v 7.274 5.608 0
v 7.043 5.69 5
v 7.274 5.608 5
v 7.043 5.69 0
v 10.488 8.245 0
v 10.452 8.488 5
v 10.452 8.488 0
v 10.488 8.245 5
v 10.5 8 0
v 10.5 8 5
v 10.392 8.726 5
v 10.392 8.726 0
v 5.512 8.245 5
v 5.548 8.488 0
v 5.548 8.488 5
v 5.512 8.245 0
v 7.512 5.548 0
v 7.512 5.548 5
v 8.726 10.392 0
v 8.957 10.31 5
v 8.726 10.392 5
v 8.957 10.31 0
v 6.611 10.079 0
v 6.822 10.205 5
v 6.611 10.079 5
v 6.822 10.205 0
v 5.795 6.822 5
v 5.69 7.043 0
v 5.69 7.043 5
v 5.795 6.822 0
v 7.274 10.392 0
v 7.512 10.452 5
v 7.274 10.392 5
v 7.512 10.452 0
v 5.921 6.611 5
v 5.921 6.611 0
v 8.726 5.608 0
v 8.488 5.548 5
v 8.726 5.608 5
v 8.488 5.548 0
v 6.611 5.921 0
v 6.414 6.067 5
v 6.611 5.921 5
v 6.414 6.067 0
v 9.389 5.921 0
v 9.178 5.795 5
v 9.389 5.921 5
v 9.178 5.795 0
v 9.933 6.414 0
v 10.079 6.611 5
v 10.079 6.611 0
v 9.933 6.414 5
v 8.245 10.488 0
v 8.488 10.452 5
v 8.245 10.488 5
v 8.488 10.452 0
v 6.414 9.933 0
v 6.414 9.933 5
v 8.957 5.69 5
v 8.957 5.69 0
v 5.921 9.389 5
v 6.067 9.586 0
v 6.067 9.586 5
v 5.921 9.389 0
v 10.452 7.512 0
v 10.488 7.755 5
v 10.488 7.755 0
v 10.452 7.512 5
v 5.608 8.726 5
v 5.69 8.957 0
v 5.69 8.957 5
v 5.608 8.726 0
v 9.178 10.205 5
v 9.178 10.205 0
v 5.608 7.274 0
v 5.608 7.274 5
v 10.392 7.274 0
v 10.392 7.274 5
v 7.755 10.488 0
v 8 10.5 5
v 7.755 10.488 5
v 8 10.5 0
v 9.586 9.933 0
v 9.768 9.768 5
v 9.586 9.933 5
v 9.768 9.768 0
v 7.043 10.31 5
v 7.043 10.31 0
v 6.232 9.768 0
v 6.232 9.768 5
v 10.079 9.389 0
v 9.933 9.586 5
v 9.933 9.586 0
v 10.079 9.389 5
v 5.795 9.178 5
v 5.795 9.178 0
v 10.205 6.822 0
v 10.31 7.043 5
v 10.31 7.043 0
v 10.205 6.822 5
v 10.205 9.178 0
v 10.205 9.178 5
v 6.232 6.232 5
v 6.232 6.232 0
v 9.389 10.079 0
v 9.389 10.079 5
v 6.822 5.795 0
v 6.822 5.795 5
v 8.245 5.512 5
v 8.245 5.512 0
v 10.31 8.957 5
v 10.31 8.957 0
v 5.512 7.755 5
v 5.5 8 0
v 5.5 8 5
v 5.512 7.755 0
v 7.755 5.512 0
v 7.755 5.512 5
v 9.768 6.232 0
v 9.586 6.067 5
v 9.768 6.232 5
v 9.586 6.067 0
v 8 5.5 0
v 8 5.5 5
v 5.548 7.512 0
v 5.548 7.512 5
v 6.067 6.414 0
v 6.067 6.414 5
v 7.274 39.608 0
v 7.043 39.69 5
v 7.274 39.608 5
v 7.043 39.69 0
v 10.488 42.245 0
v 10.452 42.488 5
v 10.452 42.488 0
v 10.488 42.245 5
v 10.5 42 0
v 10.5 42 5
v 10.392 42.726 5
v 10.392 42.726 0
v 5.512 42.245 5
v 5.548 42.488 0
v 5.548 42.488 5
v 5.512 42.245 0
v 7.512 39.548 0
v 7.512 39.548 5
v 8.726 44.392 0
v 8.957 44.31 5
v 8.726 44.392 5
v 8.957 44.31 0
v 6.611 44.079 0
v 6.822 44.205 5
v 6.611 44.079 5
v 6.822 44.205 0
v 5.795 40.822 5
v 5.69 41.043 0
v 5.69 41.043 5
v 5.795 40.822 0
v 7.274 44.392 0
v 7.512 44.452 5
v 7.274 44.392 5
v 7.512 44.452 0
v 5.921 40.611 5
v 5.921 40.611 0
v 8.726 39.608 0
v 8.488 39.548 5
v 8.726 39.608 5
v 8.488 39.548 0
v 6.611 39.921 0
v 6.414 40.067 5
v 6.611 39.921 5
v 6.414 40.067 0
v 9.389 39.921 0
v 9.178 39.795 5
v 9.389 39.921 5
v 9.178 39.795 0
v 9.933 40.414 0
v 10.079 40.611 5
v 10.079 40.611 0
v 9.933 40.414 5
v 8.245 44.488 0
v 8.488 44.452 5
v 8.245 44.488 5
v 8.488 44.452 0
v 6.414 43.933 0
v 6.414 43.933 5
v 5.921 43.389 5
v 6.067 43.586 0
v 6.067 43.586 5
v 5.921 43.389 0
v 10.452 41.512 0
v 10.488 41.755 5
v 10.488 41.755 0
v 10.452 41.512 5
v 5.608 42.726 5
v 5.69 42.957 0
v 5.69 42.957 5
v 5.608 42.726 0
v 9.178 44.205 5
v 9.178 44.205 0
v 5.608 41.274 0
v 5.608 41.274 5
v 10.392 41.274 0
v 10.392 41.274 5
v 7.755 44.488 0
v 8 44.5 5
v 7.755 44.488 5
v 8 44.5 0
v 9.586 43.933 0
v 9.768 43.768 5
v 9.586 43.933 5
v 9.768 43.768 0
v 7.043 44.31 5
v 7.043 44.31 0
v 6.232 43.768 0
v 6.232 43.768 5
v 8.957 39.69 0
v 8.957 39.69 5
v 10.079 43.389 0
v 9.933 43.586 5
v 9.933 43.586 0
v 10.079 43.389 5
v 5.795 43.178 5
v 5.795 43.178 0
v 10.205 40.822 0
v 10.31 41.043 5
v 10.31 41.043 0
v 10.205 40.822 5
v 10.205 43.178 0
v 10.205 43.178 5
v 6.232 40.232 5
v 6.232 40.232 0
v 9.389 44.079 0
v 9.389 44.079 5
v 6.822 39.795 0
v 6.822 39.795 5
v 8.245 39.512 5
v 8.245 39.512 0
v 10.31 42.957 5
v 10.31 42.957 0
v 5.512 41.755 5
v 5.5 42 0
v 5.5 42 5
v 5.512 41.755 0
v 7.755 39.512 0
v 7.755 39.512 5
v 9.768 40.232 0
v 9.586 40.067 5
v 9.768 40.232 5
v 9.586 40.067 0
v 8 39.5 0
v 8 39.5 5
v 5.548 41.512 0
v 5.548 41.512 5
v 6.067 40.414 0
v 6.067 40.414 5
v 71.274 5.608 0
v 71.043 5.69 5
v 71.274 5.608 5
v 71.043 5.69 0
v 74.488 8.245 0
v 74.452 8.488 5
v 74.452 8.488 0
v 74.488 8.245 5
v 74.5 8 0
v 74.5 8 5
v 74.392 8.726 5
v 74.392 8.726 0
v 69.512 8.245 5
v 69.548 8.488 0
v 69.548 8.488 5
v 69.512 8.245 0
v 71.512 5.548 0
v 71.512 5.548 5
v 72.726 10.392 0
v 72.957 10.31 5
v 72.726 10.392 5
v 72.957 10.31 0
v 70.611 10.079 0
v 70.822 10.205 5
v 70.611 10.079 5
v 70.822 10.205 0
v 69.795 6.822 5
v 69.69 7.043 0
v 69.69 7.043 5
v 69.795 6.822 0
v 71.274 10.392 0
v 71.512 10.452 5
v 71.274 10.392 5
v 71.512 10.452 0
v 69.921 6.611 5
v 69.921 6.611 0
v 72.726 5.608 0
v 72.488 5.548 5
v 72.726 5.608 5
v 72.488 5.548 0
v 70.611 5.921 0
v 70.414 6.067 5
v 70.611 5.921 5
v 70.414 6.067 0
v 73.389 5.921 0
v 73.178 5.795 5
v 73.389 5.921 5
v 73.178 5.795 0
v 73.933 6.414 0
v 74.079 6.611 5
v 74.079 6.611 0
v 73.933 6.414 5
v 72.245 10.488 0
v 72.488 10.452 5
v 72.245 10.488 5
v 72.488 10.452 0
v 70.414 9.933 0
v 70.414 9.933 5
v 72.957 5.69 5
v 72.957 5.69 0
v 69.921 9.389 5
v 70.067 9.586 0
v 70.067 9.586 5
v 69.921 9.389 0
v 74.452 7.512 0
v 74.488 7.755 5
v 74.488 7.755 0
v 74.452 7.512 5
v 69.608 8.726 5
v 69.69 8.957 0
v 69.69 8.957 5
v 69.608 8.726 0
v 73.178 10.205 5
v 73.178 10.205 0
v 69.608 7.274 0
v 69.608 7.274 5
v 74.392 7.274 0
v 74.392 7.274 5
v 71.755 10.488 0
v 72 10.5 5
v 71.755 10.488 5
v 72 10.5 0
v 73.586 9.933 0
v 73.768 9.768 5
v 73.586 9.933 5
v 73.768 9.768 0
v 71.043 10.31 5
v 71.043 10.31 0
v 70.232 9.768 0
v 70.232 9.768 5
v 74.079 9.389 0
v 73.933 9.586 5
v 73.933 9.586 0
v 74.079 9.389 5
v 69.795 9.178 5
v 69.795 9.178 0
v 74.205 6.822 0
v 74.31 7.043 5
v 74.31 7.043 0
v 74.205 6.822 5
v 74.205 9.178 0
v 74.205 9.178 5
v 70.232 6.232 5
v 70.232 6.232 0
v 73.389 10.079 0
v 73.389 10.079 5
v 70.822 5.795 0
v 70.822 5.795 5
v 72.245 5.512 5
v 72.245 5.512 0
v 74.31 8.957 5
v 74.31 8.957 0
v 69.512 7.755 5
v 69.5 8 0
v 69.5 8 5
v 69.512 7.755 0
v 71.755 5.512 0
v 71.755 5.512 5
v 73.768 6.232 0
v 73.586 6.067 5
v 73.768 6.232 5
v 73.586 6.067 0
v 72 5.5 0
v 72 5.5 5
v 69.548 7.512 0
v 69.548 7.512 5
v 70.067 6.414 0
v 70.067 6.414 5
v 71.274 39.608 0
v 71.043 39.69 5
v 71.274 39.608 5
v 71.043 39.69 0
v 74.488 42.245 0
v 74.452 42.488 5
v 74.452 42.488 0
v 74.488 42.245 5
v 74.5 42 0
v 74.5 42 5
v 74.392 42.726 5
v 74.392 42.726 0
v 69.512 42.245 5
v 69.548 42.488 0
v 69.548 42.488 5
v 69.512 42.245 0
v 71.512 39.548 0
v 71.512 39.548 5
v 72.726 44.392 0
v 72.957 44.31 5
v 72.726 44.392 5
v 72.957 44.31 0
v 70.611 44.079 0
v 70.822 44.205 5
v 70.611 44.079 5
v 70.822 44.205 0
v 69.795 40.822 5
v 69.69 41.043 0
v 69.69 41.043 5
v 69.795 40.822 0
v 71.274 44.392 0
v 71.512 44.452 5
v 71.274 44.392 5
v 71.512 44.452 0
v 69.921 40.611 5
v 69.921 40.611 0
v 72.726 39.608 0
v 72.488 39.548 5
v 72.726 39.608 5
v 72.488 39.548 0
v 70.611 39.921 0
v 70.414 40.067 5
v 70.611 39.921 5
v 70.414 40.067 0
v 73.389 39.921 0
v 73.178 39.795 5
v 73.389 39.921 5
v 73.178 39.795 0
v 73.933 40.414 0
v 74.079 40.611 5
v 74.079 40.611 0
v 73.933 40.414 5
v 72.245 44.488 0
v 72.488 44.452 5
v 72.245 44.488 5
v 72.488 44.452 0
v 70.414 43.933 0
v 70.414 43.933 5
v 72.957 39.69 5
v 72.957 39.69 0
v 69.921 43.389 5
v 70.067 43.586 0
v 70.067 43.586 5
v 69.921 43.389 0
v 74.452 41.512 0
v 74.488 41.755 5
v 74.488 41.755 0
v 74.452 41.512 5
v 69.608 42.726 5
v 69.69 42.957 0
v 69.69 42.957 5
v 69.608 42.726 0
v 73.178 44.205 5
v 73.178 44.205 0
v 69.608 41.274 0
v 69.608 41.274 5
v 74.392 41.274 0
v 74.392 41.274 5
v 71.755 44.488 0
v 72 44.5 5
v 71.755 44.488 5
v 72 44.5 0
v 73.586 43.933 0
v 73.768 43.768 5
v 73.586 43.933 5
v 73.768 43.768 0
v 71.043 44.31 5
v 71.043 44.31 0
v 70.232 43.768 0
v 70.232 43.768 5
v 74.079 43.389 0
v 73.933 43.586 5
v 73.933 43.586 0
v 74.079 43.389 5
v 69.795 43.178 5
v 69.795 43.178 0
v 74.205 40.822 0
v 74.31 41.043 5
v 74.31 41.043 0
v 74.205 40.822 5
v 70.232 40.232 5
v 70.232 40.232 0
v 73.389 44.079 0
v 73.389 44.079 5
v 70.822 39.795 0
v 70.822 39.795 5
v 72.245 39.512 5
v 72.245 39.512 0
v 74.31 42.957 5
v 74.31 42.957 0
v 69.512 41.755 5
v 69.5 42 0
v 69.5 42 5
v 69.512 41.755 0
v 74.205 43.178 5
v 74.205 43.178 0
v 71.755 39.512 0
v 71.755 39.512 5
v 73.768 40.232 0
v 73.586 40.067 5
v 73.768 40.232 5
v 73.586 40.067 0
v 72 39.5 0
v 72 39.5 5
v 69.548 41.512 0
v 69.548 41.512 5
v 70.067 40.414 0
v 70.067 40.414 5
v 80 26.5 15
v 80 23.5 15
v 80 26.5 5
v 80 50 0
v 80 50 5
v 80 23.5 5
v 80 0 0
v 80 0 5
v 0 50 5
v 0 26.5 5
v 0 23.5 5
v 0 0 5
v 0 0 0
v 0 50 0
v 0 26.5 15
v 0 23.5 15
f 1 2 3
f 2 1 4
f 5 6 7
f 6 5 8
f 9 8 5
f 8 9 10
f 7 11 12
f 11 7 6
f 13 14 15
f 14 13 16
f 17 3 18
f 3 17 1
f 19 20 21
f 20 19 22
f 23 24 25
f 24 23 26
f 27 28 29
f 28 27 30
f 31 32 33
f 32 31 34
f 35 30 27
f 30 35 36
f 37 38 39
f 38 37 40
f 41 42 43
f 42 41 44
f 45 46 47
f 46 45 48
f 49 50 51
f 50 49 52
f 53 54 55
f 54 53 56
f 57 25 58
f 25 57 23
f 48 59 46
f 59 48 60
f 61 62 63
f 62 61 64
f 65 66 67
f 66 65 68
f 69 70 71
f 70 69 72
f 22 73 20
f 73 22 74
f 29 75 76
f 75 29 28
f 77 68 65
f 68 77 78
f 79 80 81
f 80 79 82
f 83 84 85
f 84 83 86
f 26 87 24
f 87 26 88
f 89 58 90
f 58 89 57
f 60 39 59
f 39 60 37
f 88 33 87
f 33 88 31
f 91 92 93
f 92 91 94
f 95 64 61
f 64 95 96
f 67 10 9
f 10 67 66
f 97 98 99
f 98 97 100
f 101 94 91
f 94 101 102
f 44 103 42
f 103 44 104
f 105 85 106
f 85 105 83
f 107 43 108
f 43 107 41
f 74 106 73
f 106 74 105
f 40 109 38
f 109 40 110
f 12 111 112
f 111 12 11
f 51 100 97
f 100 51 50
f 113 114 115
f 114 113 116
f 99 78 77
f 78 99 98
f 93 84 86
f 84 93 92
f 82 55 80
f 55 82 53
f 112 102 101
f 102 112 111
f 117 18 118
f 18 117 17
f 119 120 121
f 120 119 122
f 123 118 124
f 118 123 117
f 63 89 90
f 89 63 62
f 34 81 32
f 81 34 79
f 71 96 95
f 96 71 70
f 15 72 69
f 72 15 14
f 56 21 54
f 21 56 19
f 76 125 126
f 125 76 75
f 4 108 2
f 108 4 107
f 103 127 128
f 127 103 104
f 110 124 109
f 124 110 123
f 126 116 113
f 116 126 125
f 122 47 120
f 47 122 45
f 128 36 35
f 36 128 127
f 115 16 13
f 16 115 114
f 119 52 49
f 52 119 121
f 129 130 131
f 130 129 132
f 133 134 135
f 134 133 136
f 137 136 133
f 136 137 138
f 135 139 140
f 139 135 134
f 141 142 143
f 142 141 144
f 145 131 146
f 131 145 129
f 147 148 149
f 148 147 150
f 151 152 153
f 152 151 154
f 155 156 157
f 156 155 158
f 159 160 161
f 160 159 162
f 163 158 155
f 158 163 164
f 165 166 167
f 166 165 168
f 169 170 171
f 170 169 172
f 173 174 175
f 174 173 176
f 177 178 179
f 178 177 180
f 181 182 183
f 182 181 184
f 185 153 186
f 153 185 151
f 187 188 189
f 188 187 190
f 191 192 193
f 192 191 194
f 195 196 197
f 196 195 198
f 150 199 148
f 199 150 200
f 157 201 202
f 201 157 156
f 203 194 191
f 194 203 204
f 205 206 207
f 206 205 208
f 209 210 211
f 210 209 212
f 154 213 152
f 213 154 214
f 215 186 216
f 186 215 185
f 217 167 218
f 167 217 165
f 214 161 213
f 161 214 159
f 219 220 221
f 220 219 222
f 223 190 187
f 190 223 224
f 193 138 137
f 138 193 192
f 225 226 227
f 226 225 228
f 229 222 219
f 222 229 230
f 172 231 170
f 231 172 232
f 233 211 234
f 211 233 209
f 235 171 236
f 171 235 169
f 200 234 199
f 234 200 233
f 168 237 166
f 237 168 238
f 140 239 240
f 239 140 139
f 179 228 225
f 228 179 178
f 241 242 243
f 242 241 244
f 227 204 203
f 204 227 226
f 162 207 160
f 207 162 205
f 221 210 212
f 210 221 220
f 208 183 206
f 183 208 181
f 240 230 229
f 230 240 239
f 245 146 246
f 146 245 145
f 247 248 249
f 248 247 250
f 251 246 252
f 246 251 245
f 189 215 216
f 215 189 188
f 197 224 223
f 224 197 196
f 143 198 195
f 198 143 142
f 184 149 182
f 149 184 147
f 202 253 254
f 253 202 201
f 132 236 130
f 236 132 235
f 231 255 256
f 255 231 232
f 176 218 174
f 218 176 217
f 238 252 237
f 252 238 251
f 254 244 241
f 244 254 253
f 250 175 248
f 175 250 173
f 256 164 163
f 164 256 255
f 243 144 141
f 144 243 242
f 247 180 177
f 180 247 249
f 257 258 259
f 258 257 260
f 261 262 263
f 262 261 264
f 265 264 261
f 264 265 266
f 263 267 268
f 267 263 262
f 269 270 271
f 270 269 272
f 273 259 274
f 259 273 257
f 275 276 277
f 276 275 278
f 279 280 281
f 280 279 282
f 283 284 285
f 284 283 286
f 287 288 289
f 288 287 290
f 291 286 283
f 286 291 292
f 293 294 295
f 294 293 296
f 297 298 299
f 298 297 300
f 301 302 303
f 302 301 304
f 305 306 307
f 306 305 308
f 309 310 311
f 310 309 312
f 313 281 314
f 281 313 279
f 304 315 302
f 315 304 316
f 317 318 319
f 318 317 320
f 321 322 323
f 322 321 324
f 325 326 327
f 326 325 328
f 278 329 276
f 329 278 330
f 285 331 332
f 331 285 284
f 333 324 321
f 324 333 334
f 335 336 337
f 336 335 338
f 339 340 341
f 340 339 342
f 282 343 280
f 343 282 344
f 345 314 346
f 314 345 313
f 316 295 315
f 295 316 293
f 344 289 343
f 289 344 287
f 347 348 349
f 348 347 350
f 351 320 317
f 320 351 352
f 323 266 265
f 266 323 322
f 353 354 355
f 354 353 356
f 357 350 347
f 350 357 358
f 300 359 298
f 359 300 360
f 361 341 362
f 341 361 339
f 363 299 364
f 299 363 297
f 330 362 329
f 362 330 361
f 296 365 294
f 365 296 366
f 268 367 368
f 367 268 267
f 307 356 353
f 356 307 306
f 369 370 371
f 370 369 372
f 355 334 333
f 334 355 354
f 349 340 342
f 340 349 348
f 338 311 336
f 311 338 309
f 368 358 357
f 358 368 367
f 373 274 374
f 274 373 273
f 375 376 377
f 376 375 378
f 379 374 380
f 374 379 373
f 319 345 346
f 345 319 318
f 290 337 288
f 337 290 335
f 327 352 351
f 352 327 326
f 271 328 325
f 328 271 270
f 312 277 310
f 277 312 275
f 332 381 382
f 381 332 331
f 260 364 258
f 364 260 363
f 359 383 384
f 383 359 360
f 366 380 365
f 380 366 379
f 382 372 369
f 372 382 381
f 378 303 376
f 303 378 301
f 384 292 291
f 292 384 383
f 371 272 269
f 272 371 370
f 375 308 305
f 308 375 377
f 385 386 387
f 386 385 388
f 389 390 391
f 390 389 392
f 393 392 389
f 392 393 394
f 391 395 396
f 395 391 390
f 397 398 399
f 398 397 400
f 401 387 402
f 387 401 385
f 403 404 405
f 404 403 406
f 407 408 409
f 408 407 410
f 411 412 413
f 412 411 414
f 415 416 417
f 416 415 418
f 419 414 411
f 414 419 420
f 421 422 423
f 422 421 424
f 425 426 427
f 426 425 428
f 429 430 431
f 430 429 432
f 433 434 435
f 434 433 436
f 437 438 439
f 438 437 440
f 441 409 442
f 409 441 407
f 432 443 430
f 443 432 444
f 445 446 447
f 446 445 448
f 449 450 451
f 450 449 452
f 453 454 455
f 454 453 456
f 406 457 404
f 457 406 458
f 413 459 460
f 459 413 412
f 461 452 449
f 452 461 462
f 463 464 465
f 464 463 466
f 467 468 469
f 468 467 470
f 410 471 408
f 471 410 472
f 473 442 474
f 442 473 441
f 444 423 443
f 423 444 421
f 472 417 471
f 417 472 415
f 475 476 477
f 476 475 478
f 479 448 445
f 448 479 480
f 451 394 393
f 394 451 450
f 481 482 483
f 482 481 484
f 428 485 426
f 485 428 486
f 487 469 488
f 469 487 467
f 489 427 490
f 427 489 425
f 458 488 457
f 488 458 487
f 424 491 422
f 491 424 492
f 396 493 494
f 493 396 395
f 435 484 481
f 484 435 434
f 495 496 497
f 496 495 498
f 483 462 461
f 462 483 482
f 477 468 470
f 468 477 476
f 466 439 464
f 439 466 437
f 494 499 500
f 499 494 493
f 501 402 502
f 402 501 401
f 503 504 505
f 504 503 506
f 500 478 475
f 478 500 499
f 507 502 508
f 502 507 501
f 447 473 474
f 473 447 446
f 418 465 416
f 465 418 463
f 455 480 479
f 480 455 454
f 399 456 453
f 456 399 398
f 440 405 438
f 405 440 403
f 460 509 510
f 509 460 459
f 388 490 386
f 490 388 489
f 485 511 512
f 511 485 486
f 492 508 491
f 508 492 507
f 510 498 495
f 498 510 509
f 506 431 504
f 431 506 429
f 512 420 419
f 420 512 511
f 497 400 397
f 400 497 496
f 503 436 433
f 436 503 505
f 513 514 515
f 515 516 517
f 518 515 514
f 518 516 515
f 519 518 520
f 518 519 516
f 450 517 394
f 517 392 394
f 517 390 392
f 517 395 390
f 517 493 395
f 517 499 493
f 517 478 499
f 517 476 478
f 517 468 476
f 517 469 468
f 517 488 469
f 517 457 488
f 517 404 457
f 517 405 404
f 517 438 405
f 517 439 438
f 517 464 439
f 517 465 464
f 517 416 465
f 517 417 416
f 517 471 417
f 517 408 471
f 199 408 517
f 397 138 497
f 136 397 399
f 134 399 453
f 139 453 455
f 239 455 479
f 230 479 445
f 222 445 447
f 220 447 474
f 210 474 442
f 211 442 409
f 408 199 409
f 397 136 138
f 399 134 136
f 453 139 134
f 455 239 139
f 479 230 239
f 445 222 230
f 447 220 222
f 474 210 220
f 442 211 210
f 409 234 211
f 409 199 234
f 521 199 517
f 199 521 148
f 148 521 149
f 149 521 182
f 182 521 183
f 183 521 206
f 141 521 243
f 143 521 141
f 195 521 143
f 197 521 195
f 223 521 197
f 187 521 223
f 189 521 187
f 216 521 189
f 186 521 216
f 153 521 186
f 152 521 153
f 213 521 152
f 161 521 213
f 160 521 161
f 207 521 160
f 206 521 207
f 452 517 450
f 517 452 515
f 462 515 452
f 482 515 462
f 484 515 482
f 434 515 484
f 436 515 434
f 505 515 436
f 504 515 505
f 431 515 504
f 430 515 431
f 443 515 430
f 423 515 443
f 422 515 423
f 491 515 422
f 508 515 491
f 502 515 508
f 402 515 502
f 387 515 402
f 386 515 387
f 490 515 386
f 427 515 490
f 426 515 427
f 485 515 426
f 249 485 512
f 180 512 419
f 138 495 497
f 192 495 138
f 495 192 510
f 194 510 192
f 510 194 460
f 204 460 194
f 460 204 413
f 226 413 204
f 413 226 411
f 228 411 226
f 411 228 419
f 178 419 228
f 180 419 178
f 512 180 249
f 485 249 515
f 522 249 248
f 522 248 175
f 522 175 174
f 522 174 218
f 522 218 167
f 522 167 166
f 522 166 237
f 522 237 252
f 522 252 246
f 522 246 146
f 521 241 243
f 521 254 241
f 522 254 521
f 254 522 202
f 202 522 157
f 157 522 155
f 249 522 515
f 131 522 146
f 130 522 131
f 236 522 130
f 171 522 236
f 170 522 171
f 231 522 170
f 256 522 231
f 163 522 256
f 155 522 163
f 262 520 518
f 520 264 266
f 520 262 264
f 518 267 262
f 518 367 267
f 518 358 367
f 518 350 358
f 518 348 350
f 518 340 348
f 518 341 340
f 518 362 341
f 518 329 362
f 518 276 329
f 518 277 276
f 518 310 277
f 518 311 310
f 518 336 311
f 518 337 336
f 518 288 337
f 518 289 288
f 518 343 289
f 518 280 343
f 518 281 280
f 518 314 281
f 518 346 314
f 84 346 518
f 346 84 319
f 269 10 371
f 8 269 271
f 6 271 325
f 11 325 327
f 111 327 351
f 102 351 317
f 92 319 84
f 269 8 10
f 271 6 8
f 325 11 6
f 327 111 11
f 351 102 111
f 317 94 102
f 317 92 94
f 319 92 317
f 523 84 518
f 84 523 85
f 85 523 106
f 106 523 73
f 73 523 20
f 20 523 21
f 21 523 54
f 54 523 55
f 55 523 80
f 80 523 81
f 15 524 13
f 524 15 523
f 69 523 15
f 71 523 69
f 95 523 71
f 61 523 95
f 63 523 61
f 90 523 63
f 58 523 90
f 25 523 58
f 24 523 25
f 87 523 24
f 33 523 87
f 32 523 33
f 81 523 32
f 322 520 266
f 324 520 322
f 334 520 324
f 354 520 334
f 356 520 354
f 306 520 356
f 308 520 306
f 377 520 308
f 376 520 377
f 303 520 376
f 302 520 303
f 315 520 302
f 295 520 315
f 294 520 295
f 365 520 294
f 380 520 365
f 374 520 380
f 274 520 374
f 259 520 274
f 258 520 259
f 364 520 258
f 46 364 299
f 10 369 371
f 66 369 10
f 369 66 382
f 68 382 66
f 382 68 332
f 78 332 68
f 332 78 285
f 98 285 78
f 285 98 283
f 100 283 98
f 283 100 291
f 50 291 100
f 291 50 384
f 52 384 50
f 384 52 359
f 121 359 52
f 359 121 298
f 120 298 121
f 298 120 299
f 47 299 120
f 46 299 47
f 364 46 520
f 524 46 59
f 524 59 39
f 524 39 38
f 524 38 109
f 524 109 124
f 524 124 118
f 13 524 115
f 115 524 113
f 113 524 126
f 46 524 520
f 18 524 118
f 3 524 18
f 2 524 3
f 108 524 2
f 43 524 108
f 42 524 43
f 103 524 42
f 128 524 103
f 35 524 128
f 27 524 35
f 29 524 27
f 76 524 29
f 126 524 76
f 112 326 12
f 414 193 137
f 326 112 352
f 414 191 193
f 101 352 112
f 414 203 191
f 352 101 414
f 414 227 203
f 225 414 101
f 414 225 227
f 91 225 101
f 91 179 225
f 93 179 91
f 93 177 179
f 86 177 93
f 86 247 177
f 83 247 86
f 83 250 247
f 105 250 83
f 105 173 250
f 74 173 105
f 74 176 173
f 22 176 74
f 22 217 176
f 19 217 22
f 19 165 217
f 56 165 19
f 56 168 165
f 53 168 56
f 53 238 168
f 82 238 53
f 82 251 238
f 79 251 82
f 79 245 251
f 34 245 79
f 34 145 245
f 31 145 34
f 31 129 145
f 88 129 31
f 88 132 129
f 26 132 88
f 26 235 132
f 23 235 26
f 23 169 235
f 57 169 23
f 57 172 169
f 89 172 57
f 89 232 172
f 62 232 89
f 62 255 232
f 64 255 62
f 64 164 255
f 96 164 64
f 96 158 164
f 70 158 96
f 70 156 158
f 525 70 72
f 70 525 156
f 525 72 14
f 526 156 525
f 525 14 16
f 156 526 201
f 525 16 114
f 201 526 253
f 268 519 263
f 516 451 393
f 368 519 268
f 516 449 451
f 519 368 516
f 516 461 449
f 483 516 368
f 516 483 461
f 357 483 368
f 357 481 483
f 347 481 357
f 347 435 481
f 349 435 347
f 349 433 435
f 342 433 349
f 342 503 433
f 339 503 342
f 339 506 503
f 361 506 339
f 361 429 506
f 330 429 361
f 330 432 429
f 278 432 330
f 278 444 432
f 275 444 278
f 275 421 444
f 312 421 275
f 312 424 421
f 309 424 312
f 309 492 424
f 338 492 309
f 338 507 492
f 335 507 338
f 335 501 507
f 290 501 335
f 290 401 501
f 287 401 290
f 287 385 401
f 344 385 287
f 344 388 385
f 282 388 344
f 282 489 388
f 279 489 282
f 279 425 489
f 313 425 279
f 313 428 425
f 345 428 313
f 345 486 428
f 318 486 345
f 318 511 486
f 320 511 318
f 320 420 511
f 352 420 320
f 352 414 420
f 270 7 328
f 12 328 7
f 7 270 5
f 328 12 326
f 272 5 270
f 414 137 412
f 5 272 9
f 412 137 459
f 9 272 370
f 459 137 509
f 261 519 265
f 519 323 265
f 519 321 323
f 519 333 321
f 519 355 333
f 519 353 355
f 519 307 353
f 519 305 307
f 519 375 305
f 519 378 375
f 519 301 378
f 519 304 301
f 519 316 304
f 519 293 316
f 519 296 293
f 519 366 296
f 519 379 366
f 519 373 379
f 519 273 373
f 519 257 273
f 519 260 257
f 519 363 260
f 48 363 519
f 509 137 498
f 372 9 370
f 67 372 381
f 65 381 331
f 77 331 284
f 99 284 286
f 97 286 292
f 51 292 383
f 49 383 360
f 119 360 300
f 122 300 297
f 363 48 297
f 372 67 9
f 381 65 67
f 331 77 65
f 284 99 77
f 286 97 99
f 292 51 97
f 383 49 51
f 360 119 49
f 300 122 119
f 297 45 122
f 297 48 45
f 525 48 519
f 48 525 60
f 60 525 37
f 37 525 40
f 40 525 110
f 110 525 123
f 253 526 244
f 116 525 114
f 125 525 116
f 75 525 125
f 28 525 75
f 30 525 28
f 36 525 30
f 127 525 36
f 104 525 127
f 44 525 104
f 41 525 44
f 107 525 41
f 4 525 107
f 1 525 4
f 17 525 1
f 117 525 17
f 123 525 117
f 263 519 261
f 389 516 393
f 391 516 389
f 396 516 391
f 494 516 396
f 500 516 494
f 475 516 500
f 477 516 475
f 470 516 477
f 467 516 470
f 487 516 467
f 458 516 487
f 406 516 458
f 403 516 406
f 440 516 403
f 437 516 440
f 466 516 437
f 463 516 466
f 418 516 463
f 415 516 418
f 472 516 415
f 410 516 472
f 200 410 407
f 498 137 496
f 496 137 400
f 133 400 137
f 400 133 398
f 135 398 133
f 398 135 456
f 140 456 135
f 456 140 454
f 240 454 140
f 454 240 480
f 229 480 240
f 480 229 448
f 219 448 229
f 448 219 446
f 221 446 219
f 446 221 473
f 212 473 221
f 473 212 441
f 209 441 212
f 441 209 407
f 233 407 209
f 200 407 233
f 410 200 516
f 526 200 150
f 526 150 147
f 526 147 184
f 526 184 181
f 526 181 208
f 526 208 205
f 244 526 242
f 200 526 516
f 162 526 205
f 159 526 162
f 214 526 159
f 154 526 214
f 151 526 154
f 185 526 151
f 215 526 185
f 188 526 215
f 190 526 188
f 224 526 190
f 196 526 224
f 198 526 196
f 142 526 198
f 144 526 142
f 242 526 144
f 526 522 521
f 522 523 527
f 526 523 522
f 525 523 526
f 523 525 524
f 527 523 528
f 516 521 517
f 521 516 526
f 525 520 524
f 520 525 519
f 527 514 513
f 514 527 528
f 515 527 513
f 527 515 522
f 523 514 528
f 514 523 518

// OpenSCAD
// model.scad
// Parametric demo part: a plate with 4 corner holes + optional rib

plate_x = 80;
plate_y = 50;
plate_z = 5;

hole_d = 5;
hole_edge = 8;     // distance from edge to hole center

rib_on = true;
rib_h = 10;
rib_t = 3;

module plate() {
  difference() {
    cube([plate_x, plate_y, plate_z], center=false);

    // 4 corner holes
    for (x = [hole_edge, plate_x - hole_edge])
      for (y = [hole_edge, plate_y - hole_edge])
        translate([x, y, -1])
          cylinder(h=plate_z + 2, d=hole_d, $fn=64);
  }
}

module rib() {
  // center rib along X axis
  translate([0, plate_y/2 - rib_t/2, plate_z])
    cube([plate_x, rib_t, rib_h], center=false);
}

union() {
  plate();
  if (rib_on) rib();
}
